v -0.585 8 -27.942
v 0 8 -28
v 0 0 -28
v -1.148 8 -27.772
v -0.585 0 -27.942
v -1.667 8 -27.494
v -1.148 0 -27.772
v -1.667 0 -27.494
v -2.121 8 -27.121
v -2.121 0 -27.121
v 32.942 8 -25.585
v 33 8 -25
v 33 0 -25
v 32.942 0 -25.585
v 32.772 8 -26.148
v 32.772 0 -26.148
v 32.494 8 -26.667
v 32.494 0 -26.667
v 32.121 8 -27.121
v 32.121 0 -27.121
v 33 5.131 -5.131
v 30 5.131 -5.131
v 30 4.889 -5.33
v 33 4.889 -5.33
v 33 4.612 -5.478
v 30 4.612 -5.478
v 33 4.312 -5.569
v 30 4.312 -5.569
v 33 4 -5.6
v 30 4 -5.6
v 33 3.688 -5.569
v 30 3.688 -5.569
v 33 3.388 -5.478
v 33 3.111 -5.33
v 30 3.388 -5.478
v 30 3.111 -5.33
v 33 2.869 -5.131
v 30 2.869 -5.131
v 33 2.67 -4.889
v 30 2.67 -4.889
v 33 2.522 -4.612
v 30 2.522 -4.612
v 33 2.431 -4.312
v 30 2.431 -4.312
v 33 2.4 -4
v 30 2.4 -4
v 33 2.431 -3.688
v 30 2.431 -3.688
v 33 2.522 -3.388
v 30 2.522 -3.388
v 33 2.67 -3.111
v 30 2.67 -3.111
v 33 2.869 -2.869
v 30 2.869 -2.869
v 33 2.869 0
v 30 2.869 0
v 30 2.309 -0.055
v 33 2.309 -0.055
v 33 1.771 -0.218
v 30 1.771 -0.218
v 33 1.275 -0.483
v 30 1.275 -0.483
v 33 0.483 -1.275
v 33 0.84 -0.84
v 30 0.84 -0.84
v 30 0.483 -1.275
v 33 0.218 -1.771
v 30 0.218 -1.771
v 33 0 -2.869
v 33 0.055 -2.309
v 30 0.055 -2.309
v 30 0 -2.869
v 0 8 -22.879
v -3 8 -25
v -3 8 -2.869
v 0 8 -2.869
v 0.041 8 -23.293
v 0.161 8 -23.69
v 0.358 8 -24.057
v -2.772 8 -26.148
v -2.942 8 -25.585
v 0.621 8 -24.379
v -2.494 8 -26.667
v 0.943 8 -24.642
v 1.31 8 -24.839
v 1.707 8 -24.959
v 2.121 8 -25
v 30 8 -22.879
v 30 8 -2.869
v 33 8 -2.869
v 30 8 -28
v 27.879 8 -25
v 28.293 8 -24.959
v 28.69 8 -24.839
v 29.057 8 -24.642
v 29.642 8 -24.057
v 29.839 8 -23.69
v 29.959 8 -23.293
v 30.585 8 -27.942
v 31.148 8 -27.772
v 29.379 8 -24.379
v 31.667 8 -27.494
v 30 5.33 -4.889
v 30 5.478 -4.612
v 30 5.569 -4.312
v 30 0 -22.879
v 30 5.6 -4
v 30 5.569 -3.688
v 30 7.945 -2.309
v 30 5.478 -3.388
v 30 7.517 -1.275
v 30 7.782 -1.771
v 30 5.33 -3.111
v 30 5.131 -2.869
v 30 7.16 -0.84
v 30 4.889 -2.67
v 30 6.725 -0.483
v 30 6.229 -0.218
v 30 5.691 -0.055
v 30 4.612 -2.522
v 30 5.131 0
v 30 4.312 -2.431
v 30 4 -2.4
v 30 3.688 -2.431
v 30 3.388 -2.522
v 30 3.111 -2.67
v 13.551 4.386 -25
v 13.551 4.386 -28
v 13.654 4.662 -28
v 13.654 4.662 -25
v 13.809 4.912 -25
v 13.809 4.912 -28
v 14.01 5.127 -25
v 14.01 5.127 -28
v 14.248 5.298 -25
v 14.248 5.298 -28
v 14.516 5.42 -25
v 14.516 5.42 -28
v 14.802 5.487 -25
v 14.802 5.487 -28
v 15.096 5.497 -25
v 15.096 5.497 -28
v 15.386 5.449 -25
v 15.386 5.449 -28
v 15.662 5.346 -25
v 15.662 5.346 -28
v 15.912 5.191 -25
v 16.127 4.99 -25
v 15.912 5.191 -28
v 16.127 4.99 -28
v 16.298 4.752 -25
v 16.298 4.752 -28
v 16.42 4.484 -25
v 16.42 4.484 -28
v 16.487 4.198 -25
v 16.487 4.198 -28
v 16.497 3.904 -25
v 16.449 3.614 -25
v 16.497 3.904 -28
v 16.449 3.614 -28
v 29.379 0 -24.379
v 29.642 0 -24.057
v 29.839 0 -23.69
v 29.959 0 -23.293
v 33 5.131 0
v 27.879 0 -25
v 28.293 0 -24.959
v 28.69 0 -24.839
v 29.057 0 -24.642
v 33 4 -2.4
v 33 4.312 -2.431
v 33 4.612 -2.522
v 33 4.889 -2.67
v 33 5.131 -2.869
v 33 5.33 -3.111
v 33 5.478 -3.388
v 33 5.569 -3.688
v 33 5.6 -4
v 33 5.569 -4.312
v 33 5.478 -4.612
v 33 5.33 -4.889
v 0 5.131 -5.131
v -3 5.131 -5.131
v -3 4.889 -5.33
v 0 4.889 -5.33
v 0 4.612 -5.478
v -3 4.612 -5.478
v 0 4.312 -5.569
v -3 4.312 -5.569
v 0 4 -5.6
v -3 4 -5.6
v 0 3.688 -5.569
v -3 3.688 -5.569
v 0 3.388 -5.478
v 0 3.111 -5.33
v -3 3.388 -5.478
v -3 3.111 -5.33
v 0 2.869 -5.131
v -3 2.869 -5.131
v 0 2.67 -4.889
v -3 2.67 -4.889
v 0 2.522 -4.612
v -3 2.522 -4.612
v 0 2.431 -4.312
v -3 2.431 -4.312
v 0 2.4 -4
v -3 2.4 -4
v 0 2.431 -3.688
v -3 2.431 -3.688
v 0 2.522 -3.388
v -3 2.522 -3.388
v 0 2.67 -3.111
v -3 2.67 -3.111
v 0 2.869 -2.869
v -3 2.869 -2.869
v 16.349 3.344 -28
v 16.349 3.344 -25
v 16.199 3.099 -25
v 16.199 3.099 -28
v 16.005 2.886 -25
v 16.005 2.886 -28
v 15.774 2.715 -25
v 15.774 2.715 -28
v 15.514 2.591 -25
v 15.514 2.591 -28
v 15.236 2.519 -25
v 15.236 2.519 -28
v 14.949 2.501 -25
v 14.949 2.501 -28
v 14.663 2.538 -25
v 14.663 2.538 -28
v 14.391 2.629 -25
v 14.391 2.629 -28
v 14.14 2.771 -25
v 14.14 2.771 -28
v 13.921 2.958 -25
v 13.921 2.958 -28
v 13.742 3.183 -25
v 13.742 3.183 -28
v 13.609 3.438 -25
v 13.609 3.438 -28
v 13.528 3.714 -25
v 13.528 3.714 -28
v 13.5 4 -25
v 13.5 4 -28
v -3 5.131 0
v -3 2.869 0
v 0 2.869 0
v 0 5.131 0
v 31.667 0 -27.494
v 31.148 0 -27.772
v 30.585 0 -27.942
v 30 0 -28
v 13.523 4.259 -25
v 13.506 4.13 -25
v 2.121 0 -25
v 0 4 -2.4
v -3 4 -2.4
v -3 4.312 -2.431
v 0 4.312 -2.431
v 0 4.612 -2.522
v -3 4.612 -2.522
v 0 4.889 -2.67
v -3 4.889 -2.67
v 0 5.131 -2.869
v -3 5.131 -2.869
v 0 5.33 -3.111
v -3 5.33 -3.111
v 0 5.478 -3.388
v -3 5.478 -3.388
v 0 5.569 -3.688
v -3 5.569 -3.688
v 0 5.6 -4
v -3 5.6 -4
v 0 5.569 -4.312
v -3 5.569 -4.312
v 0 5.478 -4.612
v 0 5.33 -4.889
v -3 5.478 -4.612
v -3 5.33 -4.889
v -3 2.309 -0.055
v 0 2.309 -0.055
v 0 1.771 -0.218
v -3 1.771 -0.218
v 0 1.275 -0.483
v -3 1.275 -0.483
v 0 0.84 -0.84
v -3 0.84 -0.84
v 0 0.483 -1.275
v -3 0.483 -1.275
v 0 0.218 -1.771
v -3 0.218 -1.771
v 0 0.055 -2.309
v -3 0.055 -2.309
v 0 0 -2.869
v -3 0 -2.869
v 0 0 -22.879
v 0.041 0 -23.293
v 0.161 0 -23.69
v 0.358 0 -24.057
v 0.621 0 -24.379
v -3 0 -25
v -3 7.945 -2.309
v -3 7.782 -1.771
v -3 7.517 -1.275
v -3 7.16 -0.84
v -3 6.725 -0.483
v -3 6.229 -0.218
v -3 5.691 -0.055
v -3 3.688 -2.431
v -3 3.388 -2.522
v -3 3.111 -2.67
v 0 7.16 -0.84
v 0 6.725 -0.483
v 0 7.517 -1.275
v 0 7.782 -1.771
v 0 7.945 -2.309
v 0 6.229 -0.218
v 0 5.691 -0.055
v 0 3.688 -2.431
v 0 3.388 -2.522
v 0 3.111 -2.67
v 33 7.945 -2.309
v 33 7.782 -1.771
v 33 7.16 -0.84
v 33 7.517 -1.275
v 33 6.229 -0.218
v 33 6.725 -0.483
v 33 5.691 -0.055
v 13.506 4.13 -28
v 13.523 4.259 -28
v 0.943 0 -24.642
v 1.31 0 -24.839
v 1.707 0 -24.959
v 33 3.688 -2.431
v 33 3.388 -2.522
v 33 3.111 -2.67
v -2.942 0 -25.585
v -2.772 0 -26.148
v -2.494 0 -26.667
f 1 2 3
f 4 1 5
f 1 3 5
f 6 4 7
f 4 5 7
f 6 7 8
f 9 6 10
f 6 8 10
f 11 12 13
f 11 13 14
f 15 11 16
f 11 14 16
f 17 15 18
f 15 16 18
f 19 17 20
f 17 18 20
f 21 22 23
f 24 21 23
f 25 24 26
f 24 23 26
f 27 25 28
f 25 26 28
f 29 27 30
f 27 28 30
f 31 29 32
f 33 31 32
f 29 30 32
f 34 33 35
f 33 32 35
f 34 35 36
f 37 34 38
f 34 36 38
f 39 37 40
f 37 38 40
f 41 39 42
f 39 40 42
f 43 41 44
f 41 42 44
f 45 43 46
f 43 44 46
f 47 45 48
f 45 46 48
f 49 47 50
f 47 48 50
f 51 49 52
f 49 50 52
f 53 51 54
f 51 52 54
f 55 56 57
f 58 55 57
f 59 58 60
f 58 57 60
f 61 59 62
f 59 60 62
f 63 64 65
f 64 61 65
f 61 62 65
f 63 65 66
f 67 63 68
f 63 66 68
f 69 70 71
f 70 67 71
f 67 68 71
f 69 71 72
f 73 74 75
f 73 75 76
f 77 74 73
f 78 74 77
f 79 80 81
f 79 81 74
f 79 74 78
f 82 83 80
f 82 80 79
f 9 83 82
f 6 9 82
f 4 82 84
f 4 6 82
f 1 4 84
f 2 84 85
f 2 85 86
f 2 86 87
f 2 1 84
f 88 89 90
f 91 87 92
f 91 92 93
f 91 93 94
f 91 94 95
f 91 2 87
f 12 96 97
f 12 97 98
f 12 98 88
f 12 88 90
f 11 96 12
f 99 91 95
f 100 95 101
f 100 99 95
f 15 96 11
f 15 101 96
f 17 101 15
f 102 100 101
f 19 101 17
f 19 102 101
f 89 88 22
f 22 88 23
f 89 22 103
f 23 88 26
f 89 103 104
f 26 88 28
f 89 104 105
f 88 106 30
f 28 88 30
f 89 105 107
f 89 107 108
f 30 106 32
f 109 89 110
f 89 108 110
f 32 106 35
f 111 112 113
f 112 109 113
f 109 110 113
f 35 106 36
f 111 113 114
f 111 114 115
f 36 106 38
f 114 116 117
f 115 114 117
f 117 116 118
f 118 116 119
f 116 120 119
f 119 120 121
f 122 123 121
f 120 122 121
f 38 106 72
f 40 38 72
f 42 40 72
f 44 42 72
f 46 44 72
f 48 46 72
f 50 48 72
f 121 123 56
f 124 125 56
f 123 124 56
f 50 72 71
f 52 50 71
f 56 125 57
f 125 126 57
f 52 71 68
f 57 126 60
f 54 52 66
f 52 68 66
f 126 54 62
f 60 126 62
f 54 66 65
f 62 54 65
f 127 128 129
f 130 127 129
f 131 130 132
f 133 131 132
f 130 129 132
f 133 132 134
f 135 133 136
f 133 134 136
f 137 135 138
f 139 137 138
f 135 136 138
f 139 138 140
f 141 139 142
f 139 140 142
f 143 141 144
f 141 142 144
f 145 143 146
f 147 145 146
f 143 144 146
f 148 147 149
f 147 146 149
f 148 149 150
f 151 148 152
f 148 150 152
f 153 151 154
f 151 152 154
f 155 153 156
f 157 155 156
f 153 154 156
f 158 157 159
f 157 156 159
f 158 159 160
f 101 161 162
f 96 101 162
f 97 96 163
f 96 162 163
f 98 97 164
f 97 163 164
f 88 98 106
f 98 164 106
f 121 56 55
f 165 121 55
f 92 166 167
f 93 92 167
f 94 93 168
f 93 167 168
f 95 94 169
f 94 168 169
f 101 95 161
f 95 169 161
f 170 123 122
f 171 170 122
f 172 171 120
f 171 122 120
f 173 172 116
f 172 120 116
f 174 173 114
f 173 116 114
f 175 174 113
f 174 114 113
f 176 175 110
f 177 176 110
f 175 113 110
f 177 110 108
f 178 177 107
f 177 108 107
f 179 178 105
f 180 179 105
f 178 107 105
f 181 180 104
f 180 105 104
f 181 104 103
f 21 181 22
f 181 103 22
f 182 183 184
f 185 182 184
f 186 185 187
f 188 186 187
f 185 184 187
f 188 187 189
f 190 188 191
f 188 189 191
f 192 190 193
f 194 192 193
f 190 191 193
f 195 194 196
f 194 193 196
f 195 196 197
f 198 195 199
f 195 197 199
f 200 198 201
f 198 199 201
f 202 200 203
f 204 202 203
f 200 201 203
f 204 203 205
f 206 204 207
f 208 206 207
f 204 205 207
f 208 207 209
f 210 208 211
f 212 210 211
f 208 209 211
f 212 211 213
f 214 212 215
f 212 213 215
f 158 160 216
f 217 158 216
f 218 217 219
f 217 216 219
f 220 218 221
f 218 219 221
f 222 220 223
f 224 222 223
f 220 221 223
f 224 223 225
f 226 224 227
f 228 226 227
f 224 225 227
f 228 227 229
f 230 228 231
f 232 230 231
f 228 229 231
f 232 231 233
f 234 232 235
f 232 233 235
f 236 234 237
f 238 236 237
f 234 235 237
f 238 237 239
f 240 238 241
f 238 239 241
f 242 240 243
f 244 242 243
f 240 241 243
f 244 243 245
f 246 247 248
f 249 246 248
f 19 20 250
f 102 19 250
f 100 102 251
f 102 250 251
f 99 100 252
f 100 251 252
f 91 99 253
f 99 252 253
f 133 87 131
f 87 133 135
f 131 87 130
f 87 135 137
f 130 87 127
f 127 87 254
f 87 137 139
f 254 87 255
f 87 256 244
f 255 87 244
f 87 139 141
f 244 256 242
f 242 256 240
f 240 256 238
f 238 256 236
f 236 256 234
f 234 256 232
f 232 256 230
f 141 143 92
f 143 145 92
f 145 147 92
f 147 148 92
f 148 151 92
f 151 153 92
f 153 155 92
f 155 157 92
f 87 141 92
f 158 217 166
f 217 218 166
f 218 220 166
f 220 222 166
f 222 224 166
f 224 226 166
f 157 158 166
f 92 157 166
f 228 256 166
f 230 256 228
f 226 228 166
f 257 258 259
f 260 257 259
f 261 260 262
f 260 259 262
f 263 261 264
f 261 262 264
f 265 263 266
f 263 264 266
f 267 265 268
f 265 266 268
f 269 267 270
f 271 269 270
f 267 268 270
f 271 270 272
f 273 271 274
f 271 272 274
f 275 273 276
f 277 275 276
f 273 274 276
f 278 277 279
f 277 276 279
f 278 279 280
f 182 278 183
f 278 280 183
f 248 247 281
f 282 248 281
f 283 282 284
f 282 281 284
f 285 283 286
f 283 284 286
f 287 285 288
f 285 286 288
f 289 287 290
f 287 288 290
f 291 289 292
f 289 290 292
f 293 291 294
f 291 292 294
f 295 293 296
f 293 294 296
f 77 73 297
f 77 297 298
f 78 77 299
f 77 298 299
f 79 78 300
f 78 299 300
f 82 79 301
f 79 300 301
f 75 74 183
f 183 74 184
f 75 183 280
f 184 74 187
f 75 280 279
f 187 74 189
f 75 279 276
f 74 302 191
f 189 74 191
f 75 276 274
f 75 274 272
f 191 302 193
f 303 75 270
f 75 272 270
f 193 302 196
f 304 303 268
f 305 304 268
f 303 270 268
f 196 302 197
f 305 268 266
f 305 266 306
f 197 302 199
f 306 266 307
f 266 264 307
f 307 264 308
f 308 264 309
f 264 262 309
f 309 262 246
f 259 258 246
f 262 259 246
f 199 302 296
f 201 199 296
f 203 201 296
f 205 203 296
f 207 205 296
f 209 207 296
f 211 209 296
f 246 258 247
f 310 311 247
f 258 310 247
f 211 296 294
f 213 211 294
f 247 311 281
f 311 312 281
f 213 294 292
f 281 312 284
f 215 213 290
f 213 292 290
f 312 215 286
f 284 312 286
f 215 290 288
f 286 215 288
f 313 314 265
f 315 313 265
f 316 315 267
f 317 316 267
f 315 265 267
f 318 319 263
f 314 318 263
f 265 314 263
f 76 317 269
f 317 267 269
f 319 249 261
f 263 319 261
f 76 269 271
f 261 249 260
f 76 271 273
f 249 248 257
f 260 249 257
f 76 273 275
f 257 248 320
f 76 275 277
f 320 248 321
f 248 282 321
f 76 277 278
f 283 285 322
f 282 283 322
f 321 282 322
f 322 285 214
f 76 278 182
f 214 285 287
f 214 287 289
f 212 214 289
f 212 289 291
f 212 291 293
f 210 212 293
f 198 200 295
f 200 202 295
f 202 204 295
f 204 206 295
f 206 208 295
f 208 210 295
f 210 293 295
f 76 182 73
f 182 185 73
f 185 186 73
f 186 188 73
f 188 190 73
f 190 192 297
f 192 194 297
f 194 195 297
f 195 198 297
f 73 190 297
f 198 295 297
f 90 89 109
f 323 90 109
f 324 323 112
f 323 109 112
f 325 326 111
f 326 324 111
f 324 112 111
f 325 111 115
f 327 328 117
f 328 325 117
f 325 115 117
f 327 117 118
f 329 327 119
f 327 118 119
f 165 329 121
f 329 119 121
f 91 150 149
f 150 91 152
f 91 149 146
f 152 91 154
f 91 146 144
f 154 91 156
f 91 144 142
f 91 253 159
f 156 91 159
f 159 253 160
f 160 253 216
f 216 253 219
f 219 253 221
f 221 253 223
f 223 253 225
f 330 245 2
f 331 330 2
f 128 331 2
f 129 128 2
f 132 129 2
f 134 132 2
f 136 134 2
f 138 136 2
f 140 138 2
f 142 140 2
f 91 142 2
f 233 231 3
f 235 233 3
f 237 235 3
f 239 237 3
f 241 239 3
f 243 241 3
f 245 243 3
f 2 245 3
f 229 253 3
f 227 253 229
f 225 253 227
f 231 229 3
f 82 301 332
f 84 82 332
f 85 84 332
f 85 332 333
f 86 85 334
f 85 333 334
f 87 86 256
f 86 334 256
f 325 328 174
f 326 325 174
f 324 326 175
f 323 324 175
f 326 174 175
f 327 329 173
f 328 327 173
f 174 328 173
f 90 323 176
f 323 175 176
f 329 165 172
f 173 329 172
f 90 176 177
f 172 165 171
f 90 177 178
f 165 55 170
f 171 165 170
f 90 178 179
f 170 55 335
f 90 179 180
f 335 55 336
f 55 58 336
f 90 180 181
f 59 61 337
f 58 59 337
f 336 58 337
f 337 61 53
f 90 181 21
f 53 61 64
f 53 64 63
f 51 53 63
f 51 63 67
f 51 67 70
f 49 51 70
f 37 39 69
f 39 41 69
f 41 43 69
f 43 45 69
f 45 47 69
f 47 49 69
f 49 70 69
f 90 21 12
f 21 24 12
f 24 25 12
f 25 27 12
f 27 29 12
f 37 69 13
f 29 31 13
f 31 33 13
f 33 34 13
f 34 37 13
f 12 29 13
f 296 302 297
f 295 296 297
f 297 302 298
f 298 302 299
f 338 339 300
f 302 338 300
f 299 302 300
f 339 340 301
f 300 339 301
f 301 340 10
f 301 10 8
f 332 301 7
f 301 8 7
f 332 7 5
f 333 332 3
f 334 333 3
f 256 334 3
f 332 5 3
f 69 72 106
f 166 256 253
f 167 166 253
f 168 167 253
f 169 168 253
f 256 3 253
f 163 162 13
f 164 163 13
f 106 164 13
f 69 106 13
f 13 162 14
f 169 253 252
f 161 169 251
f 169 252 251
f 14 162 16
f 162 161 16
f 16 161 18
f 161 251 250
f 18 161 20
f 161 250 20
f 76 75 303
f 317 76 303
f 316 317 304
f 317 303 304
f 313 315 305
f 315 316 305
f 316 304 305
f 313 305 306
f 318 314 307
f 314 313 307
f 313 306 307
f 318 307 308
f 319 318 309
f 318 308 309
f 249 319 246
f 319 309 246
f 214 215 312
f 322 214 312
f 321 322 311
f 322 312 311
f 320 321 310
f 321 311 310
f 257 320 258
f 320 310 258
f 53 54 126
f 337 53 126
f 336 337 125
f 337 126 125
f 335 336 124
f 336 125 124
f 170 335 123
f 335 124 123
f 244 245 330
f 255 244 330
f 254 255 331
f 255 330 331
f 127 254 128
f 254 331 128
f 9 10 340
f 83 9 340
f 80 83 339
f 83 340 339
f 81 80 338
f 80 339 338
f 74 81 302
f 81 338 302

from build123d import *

# Parameters (mm, degrees)
BOSS_EXTRUDE1_DEPTH     = 8
CUT_EXTRUDE1_DEPTH      = 1
CUT_EXTRUDE1_DEPTH_BACK = 37
CUT_EXTRUDE2_DEPTH      = 1
CUT_EXTRUDE2_DEPTH_BACK = 37
CUT_EXTRUDE6_DEPTH      = 5


with BuildPart() as part:
    # Sketch1 → Boss-Extrude1 (new body)
    with BuildSketch(Plane(origin=(0, 0, 0), x_dir=(1, 0, 0), z_dir=(0, 1, 0))):
        with BuildLine():
            Line((-3, 0), (0, 0))
            Line((0, 0), (0, 22))
            ThreePointArc((0, 22), (-2.121320344, 22.878679656), (-3, 25))
            Line((-3, 25), (-3, 0))
        make_face()
        with BuildLine():
            ThreePointArc((-3, 25), (-2.121320344, 22.878679656), (0, 22))
            Line((0, 22), (0, 22.878679656))
            Line((0, 22.878679656), (0, 25))
            Line((0, 25), (-2.121320344, 27.121320344))
            ThreePointArc((-2.121320344, 27.121320344), (-2.771638598, 26.148050297), (-3, 25))
        make_face()
        with BuildLine():
            ThreePointArc((0, 28), (-1.148050297, 27.771638598), (-2.121320344, 27.121320344))
            Line((-2.121320344, 27.121320344), (0, 25))
            Line((0, 25), (2.121320344, 25))
            Line((2.121320344, 25), (3, 25))
            ThreePointArc((3, 25), (2.121320344, 27.121320344), (0, 28))
        make_face()
        with BuildLine():
            Line((30, 28), (0, 28))
            ThreePointArc((0, 28), (2.121320344, 27.121320344), (3, 25))
            Line((3, 25), (27, 25))
            ThreePointArc((27, 25), (27.878679656, 27.121320344), (30, 28))
        make_face()
        with BuildLine():
            Line((2.121320344, 25), (0, 25))
            Line((0, 25), (0.621320344, 24.378679656))
            ThreePointArc((0.621320344, 24.378679656), (1.309526193, 24.838524104), (2.121320344, 25))
        make_face()
        with BuildLine():
            Line((0, 25), (0, 22.878679656))
            ThreePointArc((0, 22.878679656), (0.161475896, 23.690473807), (0.621320344, 24.378679656))
            Line((0.621320344, 24.378679656), (0, 25))
        make_face()
        with BuildLine():
            Line((27.878679656, 25), (30, 25))
            Line((30, 25), (32.121320344, 27.121320344))
            ThreePointArc((32.121320344, 27.121320344), (31.148050297, 27.771638598), (30, 28))
            ThreePointArc((30, 28), (27.878679656, 27.121320344), (27, 25))
            Line((27, 25), (27.878679656, 25))
        make_face()
        with BuildLine():
            Line((29.378679656, 24.378679656), (30, 25))
            Line((30, 25), (27.878679656, 25))
            ThreePointArc((27.878679656, 25), (28.690473807, 24.838524104), (29.378679656, 24.378679656))
        make_face()
        with BuildLine():
            ThreePointArc((29.378679656, 24.378679656), (29.838524104, 23.690473807), (30, 22.878679656))
            Line((30, 22.878679656), (30, 25))
            Line((30, 25), (29.378679656, 24.378679656))
        make_face()
        with BuildLine():
            Line((30, 22.878679656), (30, 22))
            ThreePointArc((30, 22), (32.121320344, 22.878679656), (33, 25))
            ThreePointArc((33, 25), (32.771638598, 26.148050297), (32.121320344, 27.121320344))
            Line((32.121320344, 27.121320344), (30, 25))
            Line((30, 25), (30, 22.878679656))
        make_face()
        with BuildLine():
            Line((30, 22), (30, 0))
            Line((30, 0), (33, 0))
            Line((33, 0), (33, 25))
            ThreePointArc((33, 25), (32.121320344, 22.878679656), (30, 22))
        make_face()
    extrude(amount=BOSS_EXTRUDE1_DEPTH)

    # Sketch2 → Cut-Extrude1 (cut, two sides)
    with BuildSketch(Plane.ZY.offset(3)) as cut_extrude1_sk:
        with BuildLine():
            ThreePointArc((-5.13137085, 5.13137085), (-5.13137085, 2.86862915), (-2.86862915, 2.86862915))
            Line((-2.86862915, 2.86862915), (-5.13137085, 5.13137085))
        make_face()
        with BuildLine():
            Line((-5.13137085, 5.13137085), (-2.86862915, 2.86862915))
            ThreePointArc((-2.86862915, 2.86862915), (-2.521792748, 3.387706508), (-2.4, 4))
            ThreePointArc((-2.4, 4), (-3.387706508, 5.478207252), (-5.13137085, 5.13137085))
        make_face()
    extrude(amount=CUT_EXTRUDE1_DEPTH, mode=Mode.SUBTRACT)
    extrude(cut_extrude1_sk.sketch, amount=-CUT_EXTRUDE1_DEPTH_BACK, mode=Mode.SUBTRACT)

    # Sketch3 → Cut-Extrude2 (cut, two sides)
    with BuildSketch(Plane.ZY.offset(3)) as cut_extrude2_sk:
        with BuildLine():
            Line((0, 0), (-2.868629152, 0))
            Line((-2.86862915, 0), (-2.86862915, -3.234663016))
            ThreePointArc((-2.86862915, -3.234663016), (2.247050128, -1.115679278), (4.366033866, 4))
            ThreePointArc((4.366033866, 4), (2.247050128, 9.115679278), (-2.86862915, 11.234663016))
            Line((-2.86862915, 11.234663016), (-2.86862915, 8))
            Line((-2.86862915, 8), (0, 8))
            Line((0, 8), (0, 5.13137085))
            Line((0, 5.13137085), (0, 2.86862915))
            Line((0, 2.86862915), (0, 0))
        make_face()
        with BuildLine():
            ThreePointArc((0, 2.86862915), (-0.840202026, 0.840202025), (-2.868629152, 0))
            Line((-2.868629152, 0), (0, 0))
            Line((0, 0), (0, 2.86862915))
        make_face()
        with BuildLine():
            Line((0, 8), (-2.86862915, 8))
            ThreePointArc((-2.86862915, 8), (-0.840202025, 7.159797975), (0, 5.13137085))
            Line((0, 5.13137085), (0, 8))
        make_face()
    extrude(amount=CUT_EXTRUDE2_DEPTH, mode=Mode.SUBTRACT)
    extrude(cut_extrude2_sk.sketch, amount=-CUT_EXTRUDE2_DEPTH_BACK, mode=Mode.SUBTRACT)

    # Sketch4 → Cut-Extrude6 (cut)
    with BuildSketch(Plane(origin=(0, 0, -28), x_dir=(-1, 0, 0), z_dir=(0, 0, -1))):
        with BuildLine():
            ThreePointArc((-13.5, 4), (-13.512715795, 4.194899187), (-13.550647591, 4.386493976))
            Line((-13.550647591, 4.386493976), (-16.449352409, 3.613506024))
            ThreePointArc((-16.449352409, 3.613506024), (-14.805100813, 2.512715795), (-13.5, 4))
        make_face()
        with BuildLine():
            Line((-16.449352409, 3.613506024), (-13.550647591, 4.386493976))
            ThreePointArc((-13.550647591, 4.386493976), (-15.386493976, 5.449352409), (-16.449352409, 3.613506024))
        make_face()
    extrude(amount=-CUT_EXTRUDE6_DEPTH, mode=Mode.SUBTRACT)


solid = part.part
